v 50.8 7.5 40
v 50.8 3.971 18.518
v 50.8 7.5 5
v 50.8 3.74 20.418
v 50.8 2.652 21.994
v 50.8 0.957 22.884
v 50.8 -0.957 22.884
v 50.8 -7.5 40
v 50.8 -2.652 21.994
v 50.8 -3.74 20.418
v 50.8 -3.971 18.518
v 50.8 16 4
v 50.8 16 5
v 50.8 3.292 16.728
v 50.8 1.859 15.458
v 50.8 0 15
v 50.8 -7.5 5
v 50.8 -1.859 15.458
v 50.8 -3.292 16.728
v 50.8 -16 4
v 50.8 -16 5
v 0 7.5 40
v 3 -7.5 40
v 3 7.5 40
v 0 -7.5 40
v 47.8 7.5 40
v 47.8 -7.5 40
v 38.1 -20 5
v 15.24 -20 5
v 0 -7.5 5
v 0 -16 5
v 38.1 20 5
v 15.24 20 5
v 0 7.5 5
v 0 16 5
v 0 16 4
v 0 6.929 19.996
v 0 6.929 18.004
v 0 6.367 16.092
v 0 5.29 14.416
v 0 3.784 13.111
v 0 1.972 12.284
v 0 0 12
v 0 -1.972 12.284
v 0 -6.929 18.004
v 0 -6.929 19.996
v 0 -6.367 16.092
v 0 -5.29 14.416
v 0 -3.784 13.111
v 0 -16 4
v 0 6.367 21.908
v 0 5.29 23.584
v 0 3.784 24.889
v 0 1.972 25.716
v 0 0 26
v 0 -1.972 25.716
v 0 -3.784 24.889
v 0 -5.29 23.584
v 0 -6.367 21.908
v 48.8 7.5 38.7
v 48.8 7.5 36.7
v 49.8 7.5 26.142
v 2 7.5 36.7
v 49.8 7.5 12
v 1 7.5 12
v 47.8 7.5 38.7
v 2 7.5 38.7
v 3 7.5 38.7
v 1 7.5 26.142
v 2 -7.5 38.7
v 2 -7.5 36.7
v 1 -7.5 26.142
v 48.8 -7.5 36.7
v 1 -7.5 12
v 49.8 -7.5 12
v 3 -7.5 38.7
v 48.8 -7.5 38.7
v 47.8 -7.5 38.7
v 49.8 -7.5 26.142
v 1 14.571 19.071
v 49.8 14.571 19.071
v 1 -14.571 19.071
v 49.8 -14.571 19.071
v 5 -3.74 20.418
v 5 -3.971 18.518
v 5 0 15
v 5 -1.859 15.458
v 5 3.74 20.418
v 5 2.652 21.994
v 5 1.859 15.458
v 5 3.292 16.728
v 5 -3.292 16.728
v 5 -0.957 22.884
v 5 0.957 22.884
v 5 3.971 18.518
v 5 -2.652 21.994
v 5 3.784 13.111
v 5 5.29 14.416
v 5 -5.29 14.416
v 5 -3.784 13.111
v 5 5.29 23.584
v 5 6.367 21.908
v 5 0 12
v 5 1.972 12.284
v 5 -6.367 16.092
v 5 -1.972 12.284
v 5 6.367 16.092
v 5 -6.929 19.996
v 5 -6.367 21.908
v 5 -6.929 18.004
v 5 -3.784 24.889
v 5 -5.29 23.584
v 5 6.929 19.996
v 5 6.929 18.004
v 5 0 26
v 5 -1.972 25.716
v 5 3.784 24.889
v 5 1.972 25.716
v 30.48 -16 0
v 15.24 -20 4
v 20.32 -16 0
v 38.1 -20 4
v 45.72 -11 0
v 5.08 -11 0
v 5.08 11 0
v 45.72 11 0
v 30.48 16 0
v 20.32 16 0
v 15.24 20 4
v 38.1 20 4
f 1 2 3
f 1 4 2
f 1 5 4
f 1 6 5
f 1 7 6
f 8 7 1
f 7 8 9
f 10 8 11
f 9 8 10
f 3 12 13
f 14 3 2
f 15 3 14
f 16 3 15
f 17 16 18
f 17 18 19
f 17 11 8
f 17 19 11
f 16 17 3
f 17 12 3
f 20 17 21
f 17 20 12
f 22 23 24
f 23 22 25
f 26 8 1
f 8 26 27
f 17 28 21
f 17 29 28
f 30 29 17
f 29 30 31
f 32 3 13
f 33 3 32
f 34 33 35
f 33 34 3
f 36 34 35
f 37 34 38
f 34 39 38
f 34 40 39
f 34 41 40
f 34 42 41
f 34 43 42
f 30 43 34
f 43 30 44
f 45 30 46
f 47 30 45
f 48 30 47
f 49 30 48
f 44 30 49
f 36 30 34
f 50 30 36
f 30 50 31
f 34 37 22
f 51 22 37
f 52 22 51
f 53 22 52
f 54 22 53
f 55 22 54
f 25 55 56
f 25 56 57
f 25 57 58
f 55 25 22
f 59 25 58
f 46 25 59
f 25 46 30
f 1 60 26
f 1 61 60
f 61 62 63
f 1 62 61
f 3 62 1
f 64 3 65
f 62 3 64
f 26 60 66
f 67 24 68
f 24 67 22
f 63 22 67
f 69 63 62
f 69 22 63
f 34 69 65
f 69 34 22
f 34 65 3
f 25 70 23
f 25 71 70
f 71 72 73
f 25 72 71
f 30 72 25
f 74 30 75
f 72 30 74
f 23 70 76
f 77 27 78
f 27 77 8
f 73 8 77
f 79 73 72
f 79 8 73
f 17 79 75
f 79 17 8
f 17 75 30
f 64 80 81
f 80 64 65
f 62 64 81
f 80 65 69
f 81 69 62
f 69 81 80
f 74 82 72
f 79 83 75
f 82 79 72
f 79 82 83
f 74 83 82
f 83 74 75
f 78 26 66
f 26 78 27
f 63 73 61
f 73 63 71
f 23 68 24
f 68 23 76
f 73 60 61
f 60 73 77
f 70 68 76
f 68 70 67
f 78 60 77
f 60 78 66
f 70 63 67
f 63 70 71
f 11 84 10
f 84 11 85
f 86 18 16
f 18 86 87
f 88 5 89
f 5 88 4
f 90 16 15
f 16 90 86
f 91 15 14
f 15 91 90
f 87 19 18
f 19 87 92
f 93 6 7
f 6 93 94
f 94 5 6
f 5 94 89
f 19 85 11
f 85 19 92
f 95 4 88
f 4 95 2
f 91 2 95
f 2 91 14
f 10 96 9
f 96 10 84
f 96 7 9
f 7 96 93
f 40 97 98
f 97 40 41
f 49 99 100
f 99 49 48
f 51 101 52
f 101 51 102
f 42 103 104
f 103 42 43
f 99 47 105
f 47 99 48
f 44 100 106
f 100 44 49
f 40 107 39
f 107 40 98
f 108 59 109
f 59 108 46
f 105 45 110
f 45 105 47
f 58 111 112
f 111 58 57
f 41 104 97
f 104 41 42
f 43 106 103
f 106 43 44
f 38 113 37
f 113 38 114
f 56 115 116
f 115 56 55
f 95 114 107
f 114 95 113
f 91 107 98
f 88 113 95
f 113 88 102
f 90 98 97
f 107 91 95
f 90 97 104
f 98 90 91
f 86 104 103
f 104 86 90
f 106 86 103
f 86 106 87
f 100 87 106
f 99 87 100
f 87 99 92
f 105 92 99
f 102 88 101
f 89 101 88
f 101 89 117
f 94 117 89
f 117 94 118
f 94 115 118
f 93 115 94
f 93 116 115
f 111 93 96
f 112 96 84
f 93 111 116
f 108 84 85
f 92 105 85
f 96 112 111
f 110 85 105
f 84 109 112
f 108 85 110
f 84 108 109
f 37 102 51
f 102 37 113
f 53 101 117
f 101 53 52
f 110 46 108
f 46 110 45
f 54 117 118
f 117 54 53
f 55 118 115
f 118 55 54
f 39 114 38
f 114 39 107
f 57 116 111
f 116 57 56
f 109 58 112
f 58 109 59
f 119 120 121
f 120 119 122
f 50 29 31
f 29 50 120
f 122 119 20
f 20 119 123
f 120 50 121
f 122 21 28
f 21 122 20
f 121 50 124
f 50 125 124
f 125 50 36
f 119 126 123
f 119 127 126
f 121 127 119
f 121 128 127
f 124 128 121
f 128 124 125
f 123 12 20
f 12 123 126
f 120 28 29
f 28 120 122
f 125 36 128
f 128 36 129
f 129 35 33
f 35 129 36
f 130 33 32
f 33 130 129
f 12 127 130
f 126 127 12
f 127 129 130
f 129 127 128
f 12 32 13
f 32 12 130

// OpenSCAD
depth=50.80;
width=15.00;
height=40;
ledHeight=31.70;

color("green",0.5){
color([1,0,0]) 
translate([0,-width/2,0]) 
difference()
{
    union() {
        translate([0,0,5])
        cube([depth, width, height-5]); 
            
        translate([1,width,12])
        rotate([45,0,0])
        cube([depth-2, 10, 10]);

        translate([1,0,12])
        rotate([45,0,0])
        cube([depth-2, 10, 10]);
    }

    translate([3, -1, ledHeight+5])
    cube([depth-6, width+2, 30]);

    translate([2, -1, ledHeight+5])
    cube([depth-4, width+2, 2]);

    translate([0, width/2, 19])
    rotate([0,90,0])
    cylinder(100, r=4);

    translate([0, width/2, 19])
    rotate([0,90,0])
    cylinder(5, r=7 );
}





translate([0,width/2,5])
wedge();
mirror([0,1,0])
translate([0,width/2,5])
wedge();
}

module wedge() {
translate([depth/2,-width/2,0])
scale([depth/20,1,1])
rotate([180,0,0])
hull(){
    linear_extrude(height=1)
    polygon([[-10,16],[-4,20],[5,20],[10,16],[10,0],[-10,0]]);
    translate([0,0,4])
    linear_extrude(height=1)
    polygon([[-8,11],[-2,16],[2,16],[8,11],[8,0],[-8,0]]);
}
}
